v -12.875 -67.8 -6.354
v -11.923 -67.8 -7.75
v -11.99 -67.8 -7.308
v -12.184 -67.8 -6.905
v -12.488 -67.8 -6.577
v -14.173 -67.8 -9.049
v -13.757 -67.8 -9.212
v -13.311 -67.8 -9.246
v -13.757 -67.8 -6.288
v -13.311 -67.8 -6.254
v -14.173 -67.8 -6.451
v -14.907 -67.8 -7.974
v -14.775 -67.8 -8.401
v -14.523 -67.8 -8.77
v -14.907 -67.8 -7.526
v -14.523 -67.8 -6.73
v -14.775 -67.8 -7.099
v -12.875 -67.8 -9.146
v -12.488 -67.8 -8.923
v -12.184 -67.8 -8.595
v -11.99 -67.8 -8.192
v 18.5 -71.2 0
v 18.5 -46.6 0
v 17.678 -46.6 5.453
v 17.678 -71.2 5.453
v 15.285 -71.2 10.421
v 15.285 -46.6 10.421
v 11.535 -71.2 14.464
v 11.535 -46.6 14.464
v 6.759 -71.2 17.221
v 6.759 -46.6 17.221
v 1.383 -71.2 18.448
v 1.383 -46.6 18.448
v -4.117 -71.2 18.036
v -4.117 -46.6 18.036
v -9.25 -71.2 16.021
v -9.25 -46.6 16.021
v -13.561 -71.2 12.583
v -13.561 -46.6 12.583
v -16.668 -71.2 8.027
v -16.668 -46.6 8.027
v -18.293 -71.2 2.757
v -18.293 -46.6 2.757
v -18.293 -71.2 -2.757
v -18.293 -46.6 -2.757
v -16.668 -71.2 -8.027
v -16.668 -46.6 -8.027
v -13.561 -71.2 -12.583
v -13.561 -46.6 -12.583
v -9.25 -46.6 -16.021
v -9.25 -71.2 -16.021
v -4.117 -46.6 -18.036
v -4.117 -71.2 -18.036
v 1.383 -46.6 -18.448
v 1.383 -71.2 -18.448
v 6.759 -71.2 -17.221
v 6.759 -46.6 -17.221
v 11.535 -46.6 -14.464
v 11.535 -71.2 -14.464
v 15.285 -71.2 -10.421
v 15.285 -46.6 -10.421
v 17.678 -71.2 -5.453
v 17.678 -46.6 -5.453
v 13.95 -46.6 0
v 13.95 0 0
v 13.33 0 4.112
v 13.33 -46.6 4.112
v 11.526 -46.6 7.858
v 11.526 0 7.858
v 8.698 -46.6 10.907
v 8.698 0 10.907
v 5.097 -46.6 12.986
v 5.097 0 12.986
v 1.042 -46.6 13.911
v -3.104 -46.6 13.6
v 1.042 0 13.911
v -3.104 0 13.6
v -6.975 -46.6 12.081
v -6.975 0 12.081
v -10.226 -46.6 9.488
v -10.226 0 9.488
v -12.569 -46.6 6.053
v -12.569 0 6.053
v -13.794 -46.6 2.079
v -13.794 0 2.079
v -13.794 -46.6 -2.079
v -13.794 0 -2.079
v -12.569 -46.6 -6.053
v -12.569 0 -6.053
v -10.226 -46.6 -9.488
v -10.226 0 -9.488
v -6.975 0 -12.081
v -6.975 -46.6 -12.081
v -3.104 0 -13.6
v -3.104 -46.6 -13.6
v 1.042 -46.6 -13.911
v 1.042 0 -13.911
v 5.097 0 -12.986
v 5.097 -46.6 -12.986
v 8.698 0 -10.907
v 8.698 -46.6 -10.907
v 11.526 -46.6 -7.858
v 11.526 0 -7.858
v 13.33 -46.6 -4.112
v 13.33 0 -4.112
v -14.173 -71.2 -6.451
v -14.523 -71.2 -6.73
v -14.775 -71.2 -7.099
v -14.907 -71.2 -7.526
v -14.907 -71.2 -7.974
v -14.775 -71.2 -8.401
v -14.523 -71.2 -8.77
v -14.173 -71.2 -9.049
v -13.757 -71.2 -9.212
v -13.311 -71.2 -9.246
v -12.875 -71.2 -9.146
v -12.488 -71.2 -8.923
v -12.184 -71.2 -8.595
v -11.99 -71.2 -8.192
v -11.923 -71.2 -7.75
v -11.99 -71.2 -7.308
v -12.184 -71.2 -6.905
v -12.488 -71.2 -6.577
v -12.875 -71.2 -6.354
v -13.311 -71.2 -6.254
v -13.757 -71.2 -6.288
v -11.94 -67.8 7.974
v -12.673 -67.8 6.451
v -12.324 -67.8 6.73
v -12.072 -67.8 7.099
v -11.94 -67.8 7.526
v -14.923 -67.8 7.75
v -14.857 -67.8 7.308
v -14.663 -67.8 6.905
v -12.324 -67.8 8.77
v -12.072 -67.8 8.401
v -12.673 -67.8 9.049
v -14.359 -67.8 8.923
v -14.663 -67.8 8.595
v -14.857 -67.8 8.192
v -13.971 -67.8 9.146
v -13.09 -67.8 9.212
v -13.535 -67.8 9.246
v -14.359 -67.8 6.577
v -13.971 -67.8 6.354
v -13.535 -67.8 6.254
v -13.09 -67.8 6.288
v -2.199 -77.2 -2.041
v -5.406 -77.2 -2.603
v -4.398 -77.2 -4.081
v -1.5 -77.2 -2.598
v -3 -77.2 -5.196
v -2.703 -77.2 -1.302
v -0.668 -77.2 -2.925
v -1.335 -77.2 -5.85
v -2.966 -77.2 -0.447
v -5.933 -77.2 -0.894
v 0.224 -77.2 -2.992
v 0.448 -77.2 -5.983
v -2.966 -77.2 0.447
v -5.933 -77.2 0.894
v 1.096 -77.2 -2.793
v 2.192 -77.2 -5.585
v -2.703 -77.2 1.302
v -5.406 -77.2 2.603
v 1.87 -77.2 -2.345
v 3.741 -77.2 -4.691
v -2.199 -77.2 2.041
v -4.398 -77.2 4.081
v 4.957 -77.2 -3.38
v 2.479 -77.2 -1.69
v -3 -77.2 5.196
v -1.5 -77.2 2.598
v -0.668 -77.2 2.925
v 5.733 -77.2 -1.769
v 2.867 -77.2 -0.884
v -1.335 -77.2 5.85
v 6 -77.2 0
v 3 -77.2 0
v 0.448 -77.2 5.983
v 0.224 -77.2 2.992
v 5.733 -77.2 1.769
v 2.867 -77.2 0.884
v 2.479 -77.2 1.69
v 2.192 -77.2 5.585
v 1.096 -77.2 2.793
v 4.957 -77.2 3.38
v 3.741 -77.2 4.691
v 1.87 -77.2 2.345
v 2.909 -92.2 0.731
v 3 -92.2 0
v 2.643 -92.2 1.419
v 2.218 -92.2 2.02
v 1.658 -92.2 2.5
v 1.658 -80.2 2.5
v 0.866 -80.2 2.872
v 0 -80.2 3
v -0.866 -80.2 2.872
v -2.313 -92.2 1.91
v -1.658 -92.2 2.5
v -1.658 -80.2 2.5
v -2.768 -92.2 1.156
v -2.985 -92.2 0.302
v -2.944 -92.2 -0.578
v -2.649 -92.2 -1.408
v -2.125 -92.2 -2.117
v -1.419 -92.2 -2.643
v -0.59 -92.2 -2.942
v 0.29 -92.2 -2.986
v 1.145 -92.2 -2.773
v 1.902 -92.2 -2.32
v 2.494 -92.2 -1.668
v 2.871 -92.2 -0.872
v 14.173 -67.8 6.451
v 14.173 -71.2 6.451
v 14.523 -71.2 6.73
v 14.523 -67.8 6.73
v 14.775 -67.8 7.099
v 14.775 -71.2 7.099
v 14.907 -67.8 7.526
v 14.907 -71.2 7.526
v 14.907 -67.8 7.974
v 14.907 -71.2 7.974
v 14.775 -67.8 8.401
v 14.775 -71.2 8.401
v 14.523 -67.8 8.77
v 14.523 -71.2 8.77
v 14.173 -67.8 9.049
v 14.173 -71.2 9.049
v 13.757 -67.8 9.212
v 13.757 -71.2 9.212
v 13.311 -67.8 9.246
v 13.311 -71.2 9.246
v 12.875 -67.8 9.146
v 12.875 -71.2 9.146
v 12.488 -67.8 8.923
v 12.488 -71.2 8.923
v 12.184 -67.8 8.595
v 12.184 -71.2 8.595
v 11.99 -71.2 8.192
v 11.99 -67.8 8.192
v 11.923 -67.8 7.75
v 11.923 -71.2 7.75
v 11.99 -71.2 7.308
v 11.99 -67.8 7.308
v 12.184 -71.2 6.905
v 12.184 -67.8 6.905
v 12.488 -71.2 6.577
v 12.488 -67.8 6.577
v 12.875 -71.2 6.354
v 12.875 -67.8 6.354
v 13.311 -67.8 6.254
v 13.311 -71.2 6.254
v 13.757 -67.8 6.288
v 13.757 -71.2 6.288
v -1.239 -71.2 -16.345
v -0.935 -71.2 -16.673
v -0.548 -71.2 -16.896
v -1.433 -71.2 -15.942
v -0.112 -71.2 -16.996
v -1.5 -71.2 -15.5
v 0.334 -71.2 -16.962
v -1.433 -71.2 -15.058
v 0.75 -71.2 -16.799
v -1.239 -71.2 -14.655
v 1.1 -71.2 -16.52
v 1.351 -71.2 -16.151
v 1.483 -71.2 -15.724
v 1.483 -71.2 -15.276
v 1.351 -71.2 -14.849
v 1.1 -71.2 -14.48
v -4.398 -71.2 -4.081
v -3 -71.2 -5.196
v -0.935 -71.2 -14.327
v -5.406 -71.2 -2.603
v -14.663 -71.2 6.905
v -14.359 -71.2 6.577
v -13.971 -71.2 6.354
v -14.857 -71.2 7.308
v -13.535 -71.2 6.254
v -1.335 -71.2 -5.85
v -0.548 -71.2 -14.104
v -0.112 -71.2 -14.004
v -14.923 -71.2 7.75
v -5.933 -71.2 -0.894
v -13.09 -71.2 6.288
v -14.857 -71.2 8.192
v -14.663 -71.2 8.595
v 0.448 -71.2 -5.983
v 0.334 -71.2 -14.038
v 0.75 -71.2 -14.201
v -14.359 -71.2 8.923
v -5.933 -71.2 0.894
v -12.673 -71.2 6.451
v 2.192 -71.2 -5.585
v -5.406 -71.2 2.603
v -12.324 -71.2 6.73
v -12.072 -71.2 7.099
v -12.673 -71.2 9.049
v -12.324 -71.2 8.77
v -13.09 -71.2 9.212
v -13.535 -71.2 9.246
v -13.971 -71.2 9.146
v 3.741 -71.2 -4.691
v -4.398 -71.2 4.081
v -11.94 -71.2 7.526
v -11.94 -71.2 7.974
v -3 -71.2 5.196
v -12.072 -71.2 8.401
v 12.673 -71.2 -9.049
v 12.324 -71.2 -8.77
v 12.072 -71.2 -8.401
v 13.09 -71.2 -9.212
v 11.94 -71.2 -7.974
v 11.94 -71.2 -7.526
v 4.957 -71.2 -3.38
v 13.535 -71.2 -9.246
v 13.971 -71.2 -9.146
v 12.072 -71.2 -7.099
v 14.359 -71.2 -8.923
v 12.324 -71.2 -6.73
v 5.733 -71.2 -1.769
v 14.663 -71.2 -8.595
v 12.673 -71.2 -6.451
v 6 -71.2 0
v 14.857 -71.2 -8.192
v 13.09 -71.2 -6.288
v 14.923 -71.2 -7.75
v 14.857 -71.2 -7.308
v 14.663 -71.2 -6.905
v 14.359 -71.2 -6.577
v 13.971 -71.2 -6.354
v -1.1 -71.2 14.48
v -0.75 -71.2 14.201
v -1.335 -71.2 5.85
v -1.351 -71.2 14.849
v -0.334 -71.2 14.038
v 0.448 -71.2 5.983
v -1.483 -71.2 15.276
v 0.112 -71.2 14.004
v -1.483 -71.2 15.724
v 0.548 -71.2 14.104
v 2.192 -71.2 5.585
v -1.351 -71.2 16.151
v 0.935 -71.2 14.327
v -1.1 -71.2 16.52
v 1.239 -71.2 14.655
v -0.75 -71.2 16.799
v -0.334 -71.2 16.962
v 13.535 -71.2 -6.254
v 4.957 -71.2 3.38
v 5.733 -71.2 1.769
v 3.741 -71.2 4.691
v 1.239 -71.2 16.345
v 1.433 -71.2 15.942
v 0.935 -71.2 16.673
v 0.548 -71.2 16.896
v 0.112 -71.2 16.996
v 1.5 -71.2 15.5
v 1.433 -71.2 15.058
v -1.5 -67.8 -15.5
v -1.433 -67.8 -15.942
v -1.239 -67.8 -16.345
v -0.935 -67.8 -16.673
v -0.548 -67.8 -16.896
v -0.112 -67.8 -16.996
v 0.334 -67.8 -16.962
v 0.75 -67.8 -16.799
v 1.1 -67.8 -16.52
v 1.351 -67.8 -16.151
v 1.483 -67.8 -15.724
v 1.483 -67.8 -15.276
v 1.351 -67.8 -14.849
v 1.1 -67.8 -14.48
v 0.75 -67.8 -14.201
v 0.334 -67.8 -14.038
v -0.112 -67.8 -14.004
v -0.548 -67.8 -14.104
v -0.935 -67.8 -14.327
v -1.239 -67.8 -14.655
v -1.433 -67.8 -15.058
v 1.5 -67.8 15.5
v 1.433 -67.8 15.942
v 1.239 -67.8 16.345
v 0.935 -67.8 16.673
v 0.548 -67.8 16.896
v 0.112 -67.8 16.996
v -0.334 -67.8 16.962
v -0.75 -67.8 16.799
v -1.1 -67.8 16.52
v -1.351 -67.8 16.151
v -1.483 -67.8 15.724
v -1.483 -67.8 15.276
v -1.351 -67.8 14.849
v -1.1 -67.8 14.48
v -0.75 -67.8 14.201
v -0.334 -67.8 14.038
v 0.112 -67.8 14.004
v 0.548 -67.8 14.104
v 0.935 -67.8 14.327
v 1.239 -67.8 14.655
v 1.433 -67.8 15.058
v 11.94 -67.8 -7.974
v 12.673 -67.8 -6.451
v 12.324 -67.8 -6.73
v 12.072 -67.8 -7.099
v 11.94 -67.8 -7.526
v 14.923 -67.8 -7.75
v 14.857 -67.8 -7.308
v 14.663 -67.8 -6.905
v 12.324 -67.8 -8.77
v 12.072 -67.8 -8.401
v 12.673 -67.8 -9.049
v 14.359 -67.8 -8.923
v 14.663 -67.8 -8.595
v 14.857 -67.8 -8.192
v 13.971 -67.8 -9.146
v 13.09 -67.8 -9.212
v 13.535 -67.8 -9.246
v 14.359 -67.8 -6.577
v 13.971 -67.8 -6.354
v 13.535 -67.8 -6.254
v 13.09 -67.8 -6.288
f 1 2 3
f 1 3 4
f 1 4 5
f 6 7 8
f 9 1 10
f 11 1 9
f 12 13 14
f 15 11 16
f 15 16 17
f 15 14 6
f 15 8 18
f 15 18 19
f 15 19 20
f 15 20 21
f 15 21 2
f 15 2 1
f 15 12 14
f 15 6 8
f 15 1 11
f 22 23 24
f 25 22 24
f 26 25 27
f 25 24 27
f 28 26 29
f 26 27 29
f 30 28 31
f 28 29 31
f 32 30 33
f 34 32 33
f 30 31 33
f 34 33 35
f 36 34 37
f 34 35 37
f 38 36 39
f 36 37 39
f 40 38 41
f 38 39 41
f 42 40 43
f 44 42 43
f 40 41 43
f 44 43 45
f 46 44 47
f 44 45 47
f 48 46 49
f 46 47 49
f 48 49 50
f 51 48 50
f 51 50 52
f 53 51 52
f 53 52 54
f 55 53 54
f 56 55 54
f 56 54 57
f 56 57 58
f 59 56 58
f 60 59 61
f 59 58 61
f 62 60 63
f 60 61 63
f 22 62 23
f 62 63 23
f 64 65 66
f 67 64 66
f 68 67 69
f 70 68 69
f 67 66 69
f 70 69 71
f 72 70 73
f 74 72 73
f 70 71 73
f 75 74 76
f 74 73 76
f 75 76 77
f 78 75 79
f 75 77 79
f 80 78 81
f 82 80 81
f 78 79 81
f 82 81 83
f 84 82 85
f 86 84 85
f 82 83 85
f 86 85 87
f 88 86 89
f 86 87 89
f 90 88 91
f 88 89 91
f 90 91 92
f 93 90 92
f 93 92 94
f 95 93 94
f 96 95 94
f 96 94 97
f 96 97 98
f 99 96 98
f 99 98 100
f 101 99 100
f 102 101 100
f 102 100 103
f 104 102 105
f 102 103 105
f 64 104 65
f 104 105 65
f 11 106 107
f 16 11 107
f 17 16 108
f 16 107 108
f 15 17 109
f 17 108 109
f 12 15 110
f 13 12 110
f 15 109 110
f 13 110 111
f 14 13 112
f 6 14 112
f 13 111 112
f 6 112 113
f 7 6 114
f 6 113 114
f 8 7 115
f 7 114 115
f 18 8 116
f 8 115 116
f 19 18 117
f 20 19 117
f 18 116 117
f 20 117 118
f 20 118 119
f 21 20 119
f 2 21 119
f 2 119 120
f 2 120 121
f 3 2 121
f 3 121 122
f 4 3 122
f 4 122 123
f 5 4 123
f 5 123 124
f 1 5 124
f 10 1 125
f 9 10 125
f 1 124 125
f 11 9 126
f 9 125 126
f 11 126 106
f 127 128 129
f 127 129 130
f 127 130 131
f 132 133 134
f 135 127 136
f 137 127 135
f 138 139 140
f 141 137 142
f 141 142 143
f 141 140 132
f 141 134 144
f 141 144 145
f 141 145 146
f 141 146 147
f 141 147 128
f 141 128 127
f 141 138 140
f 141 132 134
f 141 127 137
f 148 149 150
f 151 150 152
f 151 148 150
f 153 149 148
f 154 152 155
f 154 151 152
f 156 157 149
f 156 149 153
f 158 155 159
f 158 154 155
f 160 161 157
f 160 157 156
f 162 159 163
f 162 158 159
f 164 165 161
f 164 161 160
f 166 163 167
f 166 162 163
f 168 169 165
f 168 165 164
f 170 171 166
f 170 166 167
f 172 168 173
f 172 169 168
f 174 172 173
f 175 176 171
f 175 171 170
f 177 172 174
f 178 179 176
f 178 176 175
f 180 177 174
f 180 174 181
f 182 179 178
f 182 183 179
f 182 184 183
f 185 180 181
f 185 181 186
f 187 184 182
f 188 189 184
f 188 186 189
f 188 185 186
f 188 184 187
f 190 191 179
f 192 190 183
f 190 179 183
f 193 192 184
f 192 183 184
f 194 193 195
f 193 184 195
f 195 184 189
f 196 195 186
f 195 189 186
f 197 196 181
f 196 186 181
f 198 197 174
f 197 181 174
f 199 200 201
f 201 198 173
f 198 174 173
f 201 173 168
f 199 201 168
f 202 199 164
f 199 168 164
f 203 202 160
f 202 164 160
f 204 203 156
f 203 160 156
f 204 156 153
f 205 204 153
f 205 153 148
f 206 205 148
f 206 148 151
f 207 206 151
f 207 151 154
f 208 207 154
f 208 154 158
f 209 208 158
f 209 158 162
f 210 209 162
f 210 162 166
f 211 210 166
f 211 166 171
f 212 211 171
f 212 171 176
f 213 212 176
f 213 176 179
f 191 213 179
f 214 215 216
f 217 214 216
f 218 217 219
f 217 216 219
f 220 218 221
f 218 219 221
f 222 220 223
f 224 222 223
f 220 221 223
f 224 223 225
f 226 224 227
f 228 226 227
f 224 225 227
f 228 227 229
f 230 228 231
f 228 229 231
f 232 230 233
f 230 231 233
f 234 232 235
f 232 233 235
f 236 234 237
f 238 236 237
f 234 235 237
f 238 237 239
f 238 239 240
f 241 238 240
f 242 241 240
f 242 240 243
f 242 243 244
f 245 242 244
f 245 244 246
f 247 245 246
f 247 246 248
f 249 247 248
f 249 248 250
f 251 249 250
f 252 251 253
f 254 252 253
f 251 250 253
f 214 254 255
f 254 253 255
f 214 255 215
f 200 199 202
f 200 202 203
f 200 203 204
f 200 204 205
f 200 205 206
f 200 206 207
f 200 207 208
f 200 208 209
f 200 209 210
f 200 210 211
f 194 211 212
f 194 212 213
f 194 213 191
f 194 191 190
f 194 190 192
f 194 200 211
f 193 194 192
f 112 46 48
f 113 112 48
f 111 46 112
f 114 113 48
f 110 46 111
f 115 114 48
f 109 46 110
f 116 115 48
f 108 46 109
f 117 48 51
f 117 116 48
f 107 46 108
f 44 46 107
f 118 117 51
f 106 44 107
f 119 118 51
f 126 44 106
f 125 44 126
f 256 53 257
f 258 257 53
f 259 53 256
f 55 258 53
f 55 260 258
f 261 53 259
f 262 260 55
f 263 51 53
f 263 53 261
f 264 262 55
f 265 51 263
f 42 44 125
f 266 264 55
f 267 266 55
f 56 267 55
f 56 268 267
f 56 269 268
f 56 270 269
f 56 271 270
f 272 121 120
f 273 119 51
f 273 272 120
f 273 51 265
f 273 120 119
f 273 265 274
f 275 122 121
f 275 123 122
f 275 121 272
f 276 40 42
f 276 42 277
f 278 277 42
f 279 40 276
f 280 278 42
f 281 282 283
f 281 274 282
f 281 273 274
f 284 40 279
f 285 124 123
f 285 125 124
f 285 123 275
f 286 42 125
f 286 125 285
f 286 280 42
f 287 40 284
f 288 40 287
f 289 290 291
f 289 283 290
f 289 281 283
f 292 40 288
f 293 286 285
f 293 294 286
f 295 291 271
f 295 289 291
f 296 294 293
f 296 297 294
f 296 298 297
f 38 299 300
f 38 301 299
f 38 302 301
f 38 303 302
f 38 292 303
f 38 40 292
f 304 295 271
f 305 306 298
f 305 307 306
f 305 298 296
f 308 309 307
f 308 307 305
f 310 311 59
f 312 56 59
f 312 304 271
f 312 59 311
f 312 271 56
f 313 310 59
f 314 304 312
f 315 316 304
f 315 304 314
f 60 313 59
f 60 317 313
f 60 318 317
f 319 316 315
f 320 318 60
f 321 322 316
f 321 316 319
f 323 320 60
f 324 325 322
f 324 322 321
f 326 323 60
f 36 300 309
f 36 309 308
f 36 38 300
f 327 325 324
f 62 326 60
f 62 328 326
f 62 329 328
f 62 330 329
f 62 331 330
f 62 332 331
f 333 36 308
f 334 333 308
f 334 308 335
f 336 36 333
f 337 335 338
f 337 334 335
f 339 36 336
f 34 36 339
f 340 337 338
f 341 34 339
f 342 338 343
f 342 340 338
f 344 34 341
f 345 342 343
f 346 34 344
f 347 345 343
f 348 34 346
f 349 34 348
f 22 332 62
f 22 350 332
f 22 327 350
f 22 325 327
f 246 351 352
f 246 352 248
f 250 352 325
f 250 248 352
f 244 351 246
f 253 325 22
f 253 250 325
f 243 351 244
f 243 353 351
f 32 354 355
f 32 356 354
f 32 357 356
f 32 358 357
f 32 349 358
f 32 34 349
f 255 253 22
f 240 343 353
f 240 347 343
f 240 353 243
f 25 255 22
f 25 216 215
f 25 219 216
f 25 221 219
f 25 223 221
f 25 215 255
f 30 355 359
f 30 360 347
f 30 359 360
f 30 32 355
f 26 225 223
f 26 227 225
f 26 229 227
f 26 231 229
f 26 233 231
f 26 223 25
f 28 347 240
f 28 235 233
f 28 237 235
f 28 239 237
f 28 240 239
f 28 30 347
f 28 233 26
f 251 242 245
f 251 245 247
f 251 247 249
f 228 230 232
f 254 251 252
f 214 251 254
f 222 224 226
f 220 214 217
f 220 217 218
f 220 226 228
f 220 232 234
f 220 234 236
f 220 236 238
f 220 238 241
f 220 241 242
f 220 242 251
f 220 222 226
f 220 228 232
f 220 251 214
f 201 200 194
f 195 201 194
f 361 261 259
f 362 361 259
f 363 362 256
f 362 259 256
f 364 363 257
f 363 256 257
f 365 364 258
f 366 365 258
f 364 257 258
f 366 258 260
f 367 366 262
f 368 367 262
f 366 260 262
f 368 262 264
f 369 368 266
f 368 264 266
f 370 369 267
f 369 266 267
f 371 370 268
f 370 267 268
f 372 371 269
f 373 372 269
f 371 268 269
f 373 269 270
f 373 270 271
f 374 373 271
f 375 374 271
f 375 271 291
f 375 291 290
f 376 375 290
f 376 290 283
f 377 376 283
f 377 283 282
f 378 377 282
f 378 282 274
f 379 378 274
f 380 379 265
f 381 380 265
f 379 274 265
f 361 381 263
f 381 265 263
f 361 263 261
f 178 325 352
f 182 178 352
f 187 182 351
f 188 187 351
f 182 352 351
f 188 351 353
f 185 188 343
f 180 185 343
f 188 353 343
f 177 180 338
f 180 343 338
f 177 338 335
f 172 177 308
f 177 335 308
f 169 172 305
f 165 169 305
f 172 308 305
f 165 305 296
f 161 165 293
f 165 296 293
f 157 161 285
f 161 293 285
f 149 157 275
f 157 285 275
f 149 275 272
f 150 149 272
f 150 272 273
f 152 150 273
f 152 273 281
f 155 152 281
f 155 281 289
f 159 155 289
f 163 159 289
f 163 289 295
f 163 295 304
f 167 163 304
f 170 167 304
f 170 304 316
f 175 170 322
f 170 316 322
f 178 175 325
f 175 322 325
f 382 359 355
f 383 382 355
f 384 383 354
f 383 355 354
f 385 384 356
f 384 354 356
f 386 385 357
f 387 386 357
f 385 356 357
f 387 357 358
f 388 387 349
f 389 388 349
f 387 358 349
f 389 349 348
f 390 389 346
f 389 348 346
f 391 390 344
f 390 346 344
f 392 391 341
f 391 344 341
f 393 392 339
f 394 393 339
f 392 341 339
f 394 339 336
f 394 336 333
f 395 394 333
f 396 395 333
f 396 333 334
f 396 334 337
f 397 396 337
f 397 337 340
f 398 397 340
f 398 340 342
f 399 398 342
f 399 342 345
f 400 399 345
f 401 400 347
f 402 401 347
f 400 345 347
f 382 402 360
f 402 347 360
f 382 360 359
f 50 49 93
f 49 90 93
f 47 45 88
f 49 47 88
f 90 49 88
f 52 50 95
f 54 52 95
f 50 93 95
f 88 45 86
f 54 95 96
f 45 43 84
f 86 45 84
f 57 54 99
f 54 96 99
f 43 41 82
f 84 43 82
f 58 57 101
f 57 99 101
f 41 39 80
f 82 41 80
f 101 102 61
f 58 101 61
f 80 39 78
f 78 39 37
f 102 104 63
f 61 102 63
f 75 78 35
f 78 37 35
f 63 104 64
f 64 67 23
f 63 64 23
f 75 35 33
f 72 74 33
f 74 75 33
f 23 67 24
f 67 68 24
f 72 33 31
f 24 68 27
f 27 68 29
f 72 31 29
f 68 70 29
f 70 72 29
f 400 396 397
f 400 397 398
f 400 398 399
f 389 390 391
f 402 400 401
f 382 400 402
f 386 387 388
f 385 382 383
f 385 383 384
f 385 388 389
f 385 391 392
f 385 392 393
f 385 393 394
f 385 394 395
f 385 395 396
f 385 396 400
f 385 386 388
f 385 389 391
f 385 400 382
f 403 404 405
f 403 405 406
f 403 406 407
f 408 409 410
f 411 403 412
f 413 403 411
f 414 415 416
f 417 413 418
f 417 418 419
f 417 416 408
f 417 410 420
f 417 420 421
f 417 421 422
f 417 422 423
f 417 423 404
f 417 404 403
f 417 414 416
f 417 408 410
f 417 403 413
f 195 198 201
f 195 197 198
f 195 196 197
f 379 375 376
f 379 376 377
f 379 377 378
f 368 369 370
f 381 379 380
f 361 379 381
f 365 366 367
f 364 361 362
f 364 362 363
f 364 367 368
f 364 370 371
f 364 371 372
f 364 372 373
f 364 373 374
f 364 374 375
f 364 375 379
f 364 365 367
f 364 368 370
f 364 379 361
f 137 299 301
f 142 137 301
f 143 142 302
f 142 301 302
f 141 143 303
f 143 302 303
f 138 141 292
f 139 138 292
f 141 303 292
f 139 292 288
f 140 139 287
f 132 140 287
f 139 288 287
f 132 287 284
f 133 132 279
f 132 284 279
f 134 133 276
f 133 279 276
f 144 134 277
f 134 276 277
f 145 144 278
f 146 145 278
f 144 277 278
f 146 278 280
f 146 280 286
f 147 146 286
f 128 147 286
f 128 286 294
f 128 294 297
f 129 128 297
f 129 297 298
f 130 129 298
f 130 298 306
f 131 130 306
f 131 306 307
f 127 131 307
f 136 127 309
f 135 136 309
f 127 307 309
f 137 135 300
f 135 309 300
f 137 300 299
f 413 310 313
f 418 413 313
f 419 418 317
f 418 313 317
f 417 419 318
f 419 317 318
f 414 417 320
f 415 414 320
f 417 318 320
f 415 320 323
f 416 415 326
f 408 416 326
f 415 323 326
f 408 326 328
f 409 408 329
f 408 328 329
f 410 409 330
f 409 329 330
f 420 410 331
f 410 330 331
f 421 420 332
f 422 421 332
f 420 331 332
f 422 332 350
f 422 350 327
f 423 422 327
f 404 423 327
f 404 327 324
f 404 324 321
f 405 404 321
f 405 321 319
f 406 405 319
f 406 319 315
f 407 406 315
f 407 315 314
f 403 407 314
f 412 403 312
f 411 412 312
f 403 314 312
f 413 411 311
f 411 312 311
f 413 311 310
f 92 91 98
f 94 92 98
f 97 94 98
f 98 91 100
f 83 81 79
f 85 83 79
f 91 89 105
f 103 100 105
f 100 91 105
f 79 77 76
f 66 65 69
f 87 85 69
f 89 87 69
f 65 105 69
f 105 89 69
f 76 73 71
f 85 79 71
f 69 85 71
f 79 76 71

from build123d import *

# Parameters (mm, degrees)
F0_R             = 13.95
F1_DEPTH         = 46.6
F2_R             = 18.5
F2_R_2           = 13.95
F3_DEPTH         = 24.6
F4_R             = 6
F5_DEPTH         = 6
F6_R             = 3
F7_DEPTH         = 15
F9_DEPTH         = 12
F10_R            = 1.5
F11_DEPTH        = 3.4
F11_COPIES_COUNT = 6


# Not quite as in the source:
# - a pattern or mirror of a feature is missing from the dataset's text; its kind, count and spacing are read off the source's solid


with BuildPart() as f1:
    # F0 (on Front) → F1 (new body)
    with BuildSketch(Plane.XZ):
        Circle(F0_R)
    extrude(amount=F1_DEPTH)

    # F2 (on face) → F3 (join)
    with BuildSketch(Plane.XZ.offset(46.6)):
        Circle(F2_R)
        Circle(F2_R_2, mode=Mode.SUBTRACT)
        Circle(F2_R_2)
    extrude(amount=F3_DEPTH)

    # F4 (on face) → F5 (join)
    with BuildSketch(Plane.XZ.offset(71.2)):
        Circle(F4_R)
    extrude(amount=F5_DEPTH)

    # F6 (on face) → F7 (join)
    with BuildSketch(Plane.XZ.offset(77.2)):
        Circle(F6_R)
    extrude(amount=F7_DEPTH)

    # F8 (on face) → F9 (cut)
    with BuildSketch(Plane.XZ.offset(92.2)):
        with BuildLine():
            Line((-6.2269931659, 8.3767892187), (-6.2269931659, 2.5))
            Line((-6.2269931659, 2.5), (-1.6583123952, 2.5))
            ThreePointArc((-1.6583123952, 2.5), (0, 3), (1.6583123952, 2.5))
            Line((1.6583123952, 2.5), (9.3986019492, 2.5))
            Line((9.3986019492, 2.5), (9.3986019492, 8.3767892187))
            Line((9.3986019492, 8.3767892187), (-6.2269931659, 8.3767892187))
        make_face()
        with BuildLine():
            ThreePointArc((1.6583123952, 2.5), (0, 3), (-1.6583123952, 2.5))
            Line((-1.6583123952, 2.5), (1.6583123952, 2.5))
        make_face()
    extrude(amount=-F9_DEPTH, mode=Mode.SUBTRACT)

    # F10 (on face) → F11 (cut)
    with BuildSketch(Plane.XZ.offset(71.2)):
        with Locations((0, 15.5)):
            Circle(F10_R)
    f11 = extrude(amount=-F11_DEPTH, mode=Mode.SUBTRACT)

    # F11_copies: F11 ×6 about axis
    f11_copies_axis = Axis((0, 0, 0), (0, 1, 0))
    for i in range(1, F11_COPIES_COUNT):
        add(f11.rotate(f11_copies_axis, i * 360 / F11_COPIES_COUNT), mode=Mode.SUBTRACT)


solid = f1.part
